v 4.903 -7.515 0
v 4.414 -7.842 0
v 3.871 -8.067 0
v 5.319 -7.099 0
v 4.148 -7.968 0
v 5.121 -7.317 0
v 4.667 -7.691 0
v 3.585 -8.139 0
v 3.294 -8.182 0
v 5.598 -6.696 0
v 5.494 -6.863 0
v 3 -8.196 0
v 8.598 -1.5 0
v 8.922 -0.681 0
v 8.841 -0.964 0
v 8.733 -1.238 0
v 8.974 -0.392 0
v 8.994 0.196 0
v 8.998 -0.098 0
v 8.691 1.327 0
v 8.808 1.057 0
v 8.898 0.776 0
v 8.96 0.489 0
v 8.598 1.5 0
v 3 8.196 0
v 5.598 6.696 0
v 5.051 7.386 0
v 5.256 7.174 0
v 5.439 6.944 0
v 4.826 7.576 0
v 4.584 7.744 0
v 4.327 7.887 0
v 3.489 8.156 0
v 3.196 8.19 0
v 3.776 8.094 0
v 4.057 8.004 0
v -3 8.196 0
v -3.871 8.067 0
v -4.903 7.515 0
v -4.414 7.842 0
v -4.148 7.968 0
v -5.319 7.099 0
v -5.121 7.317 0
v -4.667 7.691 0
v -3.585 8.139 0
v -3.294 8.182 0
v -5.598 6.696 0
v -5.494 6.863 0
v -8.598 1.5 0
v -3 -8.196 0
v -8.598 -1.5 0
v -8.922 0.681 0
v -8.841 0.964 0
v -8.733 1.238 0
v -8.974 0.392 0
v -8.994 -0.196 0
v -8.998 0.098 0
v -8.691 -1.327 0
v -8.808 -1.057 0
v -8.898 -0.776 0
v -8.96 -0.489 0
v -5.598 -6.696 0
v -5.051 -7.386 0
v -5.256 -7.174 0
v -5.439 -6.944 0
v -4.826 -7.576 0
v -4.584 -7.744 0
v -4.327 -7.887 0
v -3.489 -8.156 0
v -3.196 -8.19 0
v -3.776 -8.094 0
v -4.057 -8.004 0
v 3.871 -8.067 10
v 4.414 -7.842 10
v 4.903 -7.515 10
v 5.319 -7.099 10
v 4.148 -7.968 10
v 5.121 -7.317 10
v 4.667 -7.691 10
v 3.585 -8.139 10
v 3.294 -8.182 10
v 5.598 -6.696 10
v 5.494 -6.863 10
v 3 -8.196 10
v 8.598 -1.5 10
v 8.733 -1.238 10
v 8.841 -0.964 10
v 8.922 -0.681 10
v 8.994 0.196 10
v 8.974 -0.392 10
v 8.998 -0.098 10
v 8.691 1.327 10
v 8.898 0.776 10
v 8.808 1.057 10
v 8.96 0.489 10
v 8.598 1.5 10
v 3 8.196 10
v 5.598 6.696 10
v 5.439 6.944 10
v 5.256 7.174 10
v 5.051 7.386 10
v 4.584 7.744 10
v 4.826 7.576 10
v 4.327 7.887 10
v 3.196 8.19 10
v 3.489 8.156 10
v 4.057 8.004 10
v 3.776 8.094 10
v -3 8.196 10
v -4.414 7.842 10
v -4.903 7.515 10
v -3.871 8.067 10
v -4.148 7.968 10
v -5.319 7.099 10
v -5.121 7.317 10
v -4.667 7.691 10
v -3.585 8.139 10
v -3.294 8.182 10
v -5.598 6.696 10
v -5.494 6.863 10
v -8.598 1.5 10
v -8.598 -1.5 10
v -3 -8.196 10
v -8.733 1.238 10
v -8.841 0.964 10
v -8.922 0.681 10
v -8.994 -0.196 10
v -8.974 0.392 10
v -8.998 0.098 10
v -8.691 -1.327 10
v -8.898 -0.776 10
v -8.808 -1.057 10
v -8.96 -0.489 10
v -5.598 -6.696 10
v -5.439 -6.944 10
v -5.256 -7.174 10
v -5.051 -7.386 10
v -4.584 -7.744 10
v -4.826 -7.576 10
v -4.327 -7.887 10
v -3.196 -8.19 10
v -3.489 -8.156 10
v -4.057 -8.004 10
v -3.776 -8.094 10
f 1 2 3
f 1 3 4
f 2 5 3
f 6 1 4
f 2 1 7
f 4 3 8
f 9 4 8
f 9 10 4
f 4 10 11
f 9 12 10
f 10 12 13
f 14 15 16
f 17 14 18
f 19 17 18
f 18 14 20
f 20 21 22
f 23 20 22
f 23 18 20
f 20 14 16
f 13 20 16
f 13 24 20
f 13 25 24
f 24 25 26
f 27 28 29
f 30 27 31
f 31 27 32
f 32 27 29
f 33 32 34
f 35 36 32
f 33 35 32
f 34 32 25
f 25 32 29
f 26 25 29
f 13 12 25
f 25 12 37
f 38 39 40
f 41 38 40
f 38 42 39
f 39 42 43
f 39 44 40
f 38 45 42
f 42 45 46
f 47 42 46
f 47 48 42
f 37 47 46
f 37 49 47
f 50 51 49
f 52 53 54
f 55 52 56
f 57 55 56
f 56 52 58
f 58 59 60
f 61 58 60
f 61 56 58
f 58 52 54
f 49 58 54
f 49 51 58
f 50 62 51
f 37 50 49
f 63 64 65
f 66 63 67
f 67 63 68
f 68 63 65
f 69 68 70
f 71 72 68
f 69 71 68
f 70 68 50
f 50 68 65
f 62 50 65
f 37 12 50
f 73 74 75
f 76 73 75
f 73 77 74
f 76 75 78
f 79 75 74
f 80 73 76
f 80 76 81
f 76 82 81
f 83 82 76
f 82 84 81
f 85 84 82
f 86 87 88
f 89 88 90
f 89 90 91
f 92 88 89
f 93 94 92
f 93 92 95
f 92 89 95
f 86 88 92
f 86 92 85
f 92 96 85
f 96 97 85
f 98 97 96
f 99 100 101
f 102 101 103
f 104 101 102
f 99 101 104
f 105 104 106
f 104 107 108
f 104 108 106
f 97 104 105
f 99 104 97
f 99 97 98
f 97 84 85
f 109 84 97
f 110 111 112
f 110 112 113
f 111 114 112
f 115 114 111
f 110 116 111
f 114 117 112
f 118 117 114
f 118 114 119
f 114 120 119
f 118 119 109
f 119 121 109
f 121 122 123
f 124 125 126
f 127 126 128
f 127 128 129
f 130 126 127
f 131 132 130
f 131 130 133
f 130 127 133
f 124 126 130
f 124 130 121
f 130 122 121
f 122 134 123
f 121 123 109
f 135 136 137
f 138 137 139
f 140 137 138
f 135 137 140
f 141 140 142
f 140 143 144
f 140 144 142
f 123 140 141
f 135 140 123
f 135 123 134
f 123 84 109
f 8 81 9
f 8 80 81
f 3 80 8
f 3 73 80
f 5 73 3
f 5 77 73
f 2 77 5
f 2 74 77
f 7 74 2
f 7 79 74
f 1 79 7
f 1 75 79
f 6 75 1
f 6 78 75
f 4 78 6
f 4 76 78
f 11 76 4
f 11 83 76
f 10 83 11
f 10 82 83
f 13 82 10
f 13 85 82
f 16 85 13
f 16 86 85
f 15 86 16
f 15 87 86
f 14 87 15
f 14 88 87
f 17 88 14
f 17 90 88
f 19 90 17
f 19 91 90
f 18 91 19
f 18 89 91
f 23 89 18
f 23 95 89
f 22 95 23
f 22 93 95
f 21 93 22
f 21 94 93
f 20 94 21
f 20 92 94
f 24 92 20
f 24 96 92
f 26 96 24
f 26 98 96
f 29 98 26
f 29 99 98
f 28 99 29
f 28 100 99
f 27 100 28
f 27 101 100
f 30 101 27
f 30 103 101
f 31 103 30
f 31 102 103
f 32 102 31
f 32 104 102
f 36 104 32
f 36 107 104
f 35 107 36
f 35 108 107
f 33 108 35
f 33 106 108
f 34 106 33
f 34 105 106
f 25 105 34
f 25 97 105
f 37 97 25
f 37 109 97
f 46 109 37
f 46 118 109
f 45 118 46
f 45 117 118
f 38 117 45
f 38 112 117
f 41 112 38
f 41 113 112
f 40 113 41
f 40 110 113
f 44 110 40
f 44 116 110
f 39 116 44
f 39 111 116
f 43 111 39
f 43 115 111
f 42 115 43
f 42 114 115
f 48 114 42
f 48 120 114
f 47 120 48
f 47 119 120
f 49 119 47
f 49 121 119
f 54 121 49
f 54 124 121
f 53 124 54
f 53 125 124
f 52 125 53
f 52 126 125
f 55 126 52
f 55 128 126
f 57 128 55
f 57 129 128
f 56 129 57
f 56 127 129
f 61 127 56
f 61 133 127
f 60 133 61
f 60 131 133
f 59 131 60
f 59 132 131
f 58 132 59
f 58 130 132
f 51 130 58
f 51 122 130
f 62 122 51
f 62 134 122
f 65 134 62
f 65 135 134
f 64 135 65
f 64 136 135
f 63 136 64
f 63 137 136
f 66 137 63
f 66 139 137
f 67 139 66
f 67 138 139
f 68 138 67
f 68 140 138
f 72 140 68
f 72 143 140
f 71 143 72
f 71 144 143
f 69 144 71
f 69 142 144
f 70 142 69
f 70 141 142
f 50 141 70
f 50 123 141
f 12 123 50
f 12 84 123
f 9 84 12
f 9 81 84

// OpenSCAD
SIDE = 7;
SMOOTH = 1.2;
SQRT22 = sqrt(2) / 2;
SIDESQ22 = SIDE * SQRT22;
WALL_WIDTH = 1.7;
SIDE2 = 6;
//WW = .452;
WW = 1.4;
SM = .8;

hexaS = SIDE + WALL_WIDTH;
octaS = SIDE + WALL_WIDTH;
octaTY = octaS * sin(135 / 2) + octaS * cos(135 / 2);
hexaTY = (cos(30) * SIDE * 2) + (cos(30) * WALL_WIDTH) + (cos(30) * SMOOTH / 3);

function vx(v) = [v, v];
function vy(v, t) = [ceil(abs(cos(v * 45))), t - floor(abs(cos(v * 45)))];
function zz(x, y) = sin(30) * (x + x - y);

module hexagon(side, offset = 0) {
  s = side - offset;
  
  sx = s * cos(60);
  sy = s * sin(60);
  
  offset(r = offset, $fn = 64)
    polygon([
      [-sx, sy],
      [sx, sy],
      [sx * 2, 0],
      [sx, -sy],
      [-sx, -sy],
      [-sx * 2, 0],
    ]);
}

module hexa(side = SIDE, wallWidth = WALL_WIDTH, smooth = SMOOTH, open = false, slicer = false, outerFudge = 0) {
  if (slicer) {
    hexagon(side, smooth);
  } else {
    difference() {
      hexagon(side + wallWidth + outerFudge, smooth);
      if (open) {
        hexagon(side, smooth);
      }
    }
  }
}

module octagon(side, offset = 0) {
  s = side - offset;
  
  offset(r = offset, $fn = 32)
    union()
      for(i = [0 : 1 : 7]) 
        rotate([0, 0, i * 45])
            polygon([
              [-s * cos(135 / 2), s * sin(135 / 2)], 
              [s * cos(135 / 2), s * sin(135 / 2)],
              [0, 0]
            ]);
    
}

module octa() {
  difference() {
    octagon(SIDE + WALL_WIDTH, SMOOTH);
    octagon(SIDE, SMOOTH);
  }
}

module trio(open = false) {
  rotate([0, 0, 30])
  for(r = [180 : 60 : 300]) {
    rotate([0, 0, r]) translate([0, hexaTY, 0]) hexa(open);
  }
}

module triox(aside = 5, ww = .6, scalar = 0.765) {
  bside = aside + ww / scalar;

  linear_extrude(10) union() {
    translate([cos(30) * -bside, sin(30) * bside, 0]) 
      rotate([0,0,90]) 
        hexa(aside, ww, open = true);
    
    translate([cos(30) *  bside, sin(30) * bside, 0]) 
      rotate([0,0,90]) 
        hexa(aside, ww, open = true);
    
    translate([0, sin(30) * -2 * bside, 0]) 
      rotate([0,0,90])
        hexa(aside, ww, open = true);
  }
}

module hexaLine(side = 6, x = 2, y = 2,  wallWidth = WALL_WIDTH, smooth = SMOOTH, open = true, outerFudge = 0) {
  xs = is_list(x) ? [(x[0] - 1) / 2, (x[1] - 1) / 2] : [0, (x - 1) / 2];
  ys = is_list(y) ? [y[0] - 1, y[1] - 1] : [0, y - 1];
  
  s = side + wallWidth;

  for(y = [ys[0] : 1 : ys[1]]) 
    for(x = [xs[0] : .5 : xs[1]]) {
      sm = (is_list(smooth) && is_list(smooth[y]) && is_num(smooth[y][x * 2 + 1])) ? 
        smooth[y][x * 2 + 1] : is_num(smooth[y]) ? 
          smooth[y] : is_num(smooth) ? 
            smooth : SMOOTH;
  
      sideY = (sin(60) * (s - sm)) + sm;
      sideX = s + sm * .155;
      
      tx = 3 * x * sideX;      
      ty = (((x / .5) % 2 == 0 ? 0 : 1) * sideY) + (
        2 * y * sideY
      );    

      translate([tx, ty])
        hexa(
          side = side, 
          wallWidth = wallWidth, 
          smooth = sm,
          open = open,
          outerFudge = outerFudge
        ); 
    }
}

*linear_extrude(10) hexa(side = 6.5, slicer = true, smooth = 3);
*linear_extrude(10) hexa(side = 7, slicer = true, smooth = 3);
*linear_extrude(10) hexa(side = 7.5, slicer = true, smooth = 3);
*linear_extrude(10) hexa(side = 8, slicer = true, smooth = 3);
*linear_extrude(10) hexa(side = 8.5, slicer = true, smooth = 3);
linear_extrude(10) hexa(side = 9, slicer = true, smooth = 3);

h = 70;
rows = [3, 4, 3];

module hexacomb(rows, side = SIDE2, height = h, wallWidth = WW, smooth = SM, baseHeight = 1.3) {
  count = len(rows) - 1;
  
  translate([0, 0, baseHeight])
    linear_extrude(height - baseHeight)
      union() {
        for (i = [0 : 1 : count]) {
          ry = (i % 2 == 0 && i > 0 && rows[i] > rows[i - 1]) ? [1 - (rows[i] - rows[i - 1]), rows[i] - 1] : [1, rows[i]];

          if (i == 0 || i == count|| rows[i] <= 2) {
            hexaLine(side, [i, i], ry, wallWidth, smooth);
          } else {
            hexaLine(side, [i, i], [ry[0] - 1, ry[0] - 1], wallWidth, smooth);
            hexaLine(side, [i, i], ry, wallWidth, smooth, outerFudge = wallWidth - 0.1);
            hexaLine(side, [i, i], [ry[1] + 1, ry[1] + 1], wallWidth, smooth);
          }
        }
      }
    
  linear_extrude(baseHeight)
    union() {
      for (i = [0 : 1 : count]) {
        ry = (i % 2 == 0 && i > 0 && rows[i] > rows[i - 1]) ? [2 - (rows[i] - rows[i - 1]), rows[i] - 2] : [2, rows[i] - 1];
        
        if (i == 0 || i == count|| rows[i] <= 2) {
          hexaLine(side, [i, i], [ry[0] - 1, ry[1] + 1], wallWidth, smooth, false);
        } else {
          hexaLine(side, [i, i], [ry[0] - 1, ry[0] - 1], wallWidth, smooth, false);
          offset(wallWidth * 2) 
            hexaLine(side, [i, i], ry, wallWidth, smooth, false);
          hexaLine(side, [i, i], [ry[1] + 1, ry[1] + 1], wallWidth, smooth, false);
        }
      }
    }
}

*hexacomb(rows = rows, baseHeight = .9);


*linear_extrude(10) 
  union() {
hexa(5.5, .6, open = true);
translate([0, aa[0], 0]) {
  hexa(6, .6, open = true);
  translate([0, aa[1] - 0.12, 0]) {
    hexa(6.5, .6, open = true);
    translate([0, aa[2] - 0.26, 0]) {
      hexa(7, .6, open = true);
      translate([0, aa[3] - 0.42, 0]) {
      #  hexa(7.5, .6, open = true);
        translate([0, aa[4] - 0.54, 0]) {
          hexa(8, .6, open = true);
          translate([0, aa[5] - 0.66, 0]) {
            hexa(8.5, .6, open = true);
            translate([0, aa[6] - 0.80, 0]) {
              hexa(9, .6, open = true);
              translate([0, aa[7] - 1.4, 0]) {
                hexa(9, .6, open = true);
              }
            }
          }
        }
      }
    }
  }
}
}

// OLD PENCIL HOLDER
*group() {
  linear_extrude(1) {
    rotate([0, 0, 30]) hexa();
    
    for (i = [0 : 1 : 4]) {
      translate([hexaTY * i, 0, 0]) trio();
    }
  }

  translate([0, 0, 1])
    linear_extrude(80) {
      rotate([0, 0, 30]) hexa(true);
      
      for (i = [0 : 1 : 4]) {
        translate([hexaTY * i, 0, 0]) trio(true);
      }
    }
}
